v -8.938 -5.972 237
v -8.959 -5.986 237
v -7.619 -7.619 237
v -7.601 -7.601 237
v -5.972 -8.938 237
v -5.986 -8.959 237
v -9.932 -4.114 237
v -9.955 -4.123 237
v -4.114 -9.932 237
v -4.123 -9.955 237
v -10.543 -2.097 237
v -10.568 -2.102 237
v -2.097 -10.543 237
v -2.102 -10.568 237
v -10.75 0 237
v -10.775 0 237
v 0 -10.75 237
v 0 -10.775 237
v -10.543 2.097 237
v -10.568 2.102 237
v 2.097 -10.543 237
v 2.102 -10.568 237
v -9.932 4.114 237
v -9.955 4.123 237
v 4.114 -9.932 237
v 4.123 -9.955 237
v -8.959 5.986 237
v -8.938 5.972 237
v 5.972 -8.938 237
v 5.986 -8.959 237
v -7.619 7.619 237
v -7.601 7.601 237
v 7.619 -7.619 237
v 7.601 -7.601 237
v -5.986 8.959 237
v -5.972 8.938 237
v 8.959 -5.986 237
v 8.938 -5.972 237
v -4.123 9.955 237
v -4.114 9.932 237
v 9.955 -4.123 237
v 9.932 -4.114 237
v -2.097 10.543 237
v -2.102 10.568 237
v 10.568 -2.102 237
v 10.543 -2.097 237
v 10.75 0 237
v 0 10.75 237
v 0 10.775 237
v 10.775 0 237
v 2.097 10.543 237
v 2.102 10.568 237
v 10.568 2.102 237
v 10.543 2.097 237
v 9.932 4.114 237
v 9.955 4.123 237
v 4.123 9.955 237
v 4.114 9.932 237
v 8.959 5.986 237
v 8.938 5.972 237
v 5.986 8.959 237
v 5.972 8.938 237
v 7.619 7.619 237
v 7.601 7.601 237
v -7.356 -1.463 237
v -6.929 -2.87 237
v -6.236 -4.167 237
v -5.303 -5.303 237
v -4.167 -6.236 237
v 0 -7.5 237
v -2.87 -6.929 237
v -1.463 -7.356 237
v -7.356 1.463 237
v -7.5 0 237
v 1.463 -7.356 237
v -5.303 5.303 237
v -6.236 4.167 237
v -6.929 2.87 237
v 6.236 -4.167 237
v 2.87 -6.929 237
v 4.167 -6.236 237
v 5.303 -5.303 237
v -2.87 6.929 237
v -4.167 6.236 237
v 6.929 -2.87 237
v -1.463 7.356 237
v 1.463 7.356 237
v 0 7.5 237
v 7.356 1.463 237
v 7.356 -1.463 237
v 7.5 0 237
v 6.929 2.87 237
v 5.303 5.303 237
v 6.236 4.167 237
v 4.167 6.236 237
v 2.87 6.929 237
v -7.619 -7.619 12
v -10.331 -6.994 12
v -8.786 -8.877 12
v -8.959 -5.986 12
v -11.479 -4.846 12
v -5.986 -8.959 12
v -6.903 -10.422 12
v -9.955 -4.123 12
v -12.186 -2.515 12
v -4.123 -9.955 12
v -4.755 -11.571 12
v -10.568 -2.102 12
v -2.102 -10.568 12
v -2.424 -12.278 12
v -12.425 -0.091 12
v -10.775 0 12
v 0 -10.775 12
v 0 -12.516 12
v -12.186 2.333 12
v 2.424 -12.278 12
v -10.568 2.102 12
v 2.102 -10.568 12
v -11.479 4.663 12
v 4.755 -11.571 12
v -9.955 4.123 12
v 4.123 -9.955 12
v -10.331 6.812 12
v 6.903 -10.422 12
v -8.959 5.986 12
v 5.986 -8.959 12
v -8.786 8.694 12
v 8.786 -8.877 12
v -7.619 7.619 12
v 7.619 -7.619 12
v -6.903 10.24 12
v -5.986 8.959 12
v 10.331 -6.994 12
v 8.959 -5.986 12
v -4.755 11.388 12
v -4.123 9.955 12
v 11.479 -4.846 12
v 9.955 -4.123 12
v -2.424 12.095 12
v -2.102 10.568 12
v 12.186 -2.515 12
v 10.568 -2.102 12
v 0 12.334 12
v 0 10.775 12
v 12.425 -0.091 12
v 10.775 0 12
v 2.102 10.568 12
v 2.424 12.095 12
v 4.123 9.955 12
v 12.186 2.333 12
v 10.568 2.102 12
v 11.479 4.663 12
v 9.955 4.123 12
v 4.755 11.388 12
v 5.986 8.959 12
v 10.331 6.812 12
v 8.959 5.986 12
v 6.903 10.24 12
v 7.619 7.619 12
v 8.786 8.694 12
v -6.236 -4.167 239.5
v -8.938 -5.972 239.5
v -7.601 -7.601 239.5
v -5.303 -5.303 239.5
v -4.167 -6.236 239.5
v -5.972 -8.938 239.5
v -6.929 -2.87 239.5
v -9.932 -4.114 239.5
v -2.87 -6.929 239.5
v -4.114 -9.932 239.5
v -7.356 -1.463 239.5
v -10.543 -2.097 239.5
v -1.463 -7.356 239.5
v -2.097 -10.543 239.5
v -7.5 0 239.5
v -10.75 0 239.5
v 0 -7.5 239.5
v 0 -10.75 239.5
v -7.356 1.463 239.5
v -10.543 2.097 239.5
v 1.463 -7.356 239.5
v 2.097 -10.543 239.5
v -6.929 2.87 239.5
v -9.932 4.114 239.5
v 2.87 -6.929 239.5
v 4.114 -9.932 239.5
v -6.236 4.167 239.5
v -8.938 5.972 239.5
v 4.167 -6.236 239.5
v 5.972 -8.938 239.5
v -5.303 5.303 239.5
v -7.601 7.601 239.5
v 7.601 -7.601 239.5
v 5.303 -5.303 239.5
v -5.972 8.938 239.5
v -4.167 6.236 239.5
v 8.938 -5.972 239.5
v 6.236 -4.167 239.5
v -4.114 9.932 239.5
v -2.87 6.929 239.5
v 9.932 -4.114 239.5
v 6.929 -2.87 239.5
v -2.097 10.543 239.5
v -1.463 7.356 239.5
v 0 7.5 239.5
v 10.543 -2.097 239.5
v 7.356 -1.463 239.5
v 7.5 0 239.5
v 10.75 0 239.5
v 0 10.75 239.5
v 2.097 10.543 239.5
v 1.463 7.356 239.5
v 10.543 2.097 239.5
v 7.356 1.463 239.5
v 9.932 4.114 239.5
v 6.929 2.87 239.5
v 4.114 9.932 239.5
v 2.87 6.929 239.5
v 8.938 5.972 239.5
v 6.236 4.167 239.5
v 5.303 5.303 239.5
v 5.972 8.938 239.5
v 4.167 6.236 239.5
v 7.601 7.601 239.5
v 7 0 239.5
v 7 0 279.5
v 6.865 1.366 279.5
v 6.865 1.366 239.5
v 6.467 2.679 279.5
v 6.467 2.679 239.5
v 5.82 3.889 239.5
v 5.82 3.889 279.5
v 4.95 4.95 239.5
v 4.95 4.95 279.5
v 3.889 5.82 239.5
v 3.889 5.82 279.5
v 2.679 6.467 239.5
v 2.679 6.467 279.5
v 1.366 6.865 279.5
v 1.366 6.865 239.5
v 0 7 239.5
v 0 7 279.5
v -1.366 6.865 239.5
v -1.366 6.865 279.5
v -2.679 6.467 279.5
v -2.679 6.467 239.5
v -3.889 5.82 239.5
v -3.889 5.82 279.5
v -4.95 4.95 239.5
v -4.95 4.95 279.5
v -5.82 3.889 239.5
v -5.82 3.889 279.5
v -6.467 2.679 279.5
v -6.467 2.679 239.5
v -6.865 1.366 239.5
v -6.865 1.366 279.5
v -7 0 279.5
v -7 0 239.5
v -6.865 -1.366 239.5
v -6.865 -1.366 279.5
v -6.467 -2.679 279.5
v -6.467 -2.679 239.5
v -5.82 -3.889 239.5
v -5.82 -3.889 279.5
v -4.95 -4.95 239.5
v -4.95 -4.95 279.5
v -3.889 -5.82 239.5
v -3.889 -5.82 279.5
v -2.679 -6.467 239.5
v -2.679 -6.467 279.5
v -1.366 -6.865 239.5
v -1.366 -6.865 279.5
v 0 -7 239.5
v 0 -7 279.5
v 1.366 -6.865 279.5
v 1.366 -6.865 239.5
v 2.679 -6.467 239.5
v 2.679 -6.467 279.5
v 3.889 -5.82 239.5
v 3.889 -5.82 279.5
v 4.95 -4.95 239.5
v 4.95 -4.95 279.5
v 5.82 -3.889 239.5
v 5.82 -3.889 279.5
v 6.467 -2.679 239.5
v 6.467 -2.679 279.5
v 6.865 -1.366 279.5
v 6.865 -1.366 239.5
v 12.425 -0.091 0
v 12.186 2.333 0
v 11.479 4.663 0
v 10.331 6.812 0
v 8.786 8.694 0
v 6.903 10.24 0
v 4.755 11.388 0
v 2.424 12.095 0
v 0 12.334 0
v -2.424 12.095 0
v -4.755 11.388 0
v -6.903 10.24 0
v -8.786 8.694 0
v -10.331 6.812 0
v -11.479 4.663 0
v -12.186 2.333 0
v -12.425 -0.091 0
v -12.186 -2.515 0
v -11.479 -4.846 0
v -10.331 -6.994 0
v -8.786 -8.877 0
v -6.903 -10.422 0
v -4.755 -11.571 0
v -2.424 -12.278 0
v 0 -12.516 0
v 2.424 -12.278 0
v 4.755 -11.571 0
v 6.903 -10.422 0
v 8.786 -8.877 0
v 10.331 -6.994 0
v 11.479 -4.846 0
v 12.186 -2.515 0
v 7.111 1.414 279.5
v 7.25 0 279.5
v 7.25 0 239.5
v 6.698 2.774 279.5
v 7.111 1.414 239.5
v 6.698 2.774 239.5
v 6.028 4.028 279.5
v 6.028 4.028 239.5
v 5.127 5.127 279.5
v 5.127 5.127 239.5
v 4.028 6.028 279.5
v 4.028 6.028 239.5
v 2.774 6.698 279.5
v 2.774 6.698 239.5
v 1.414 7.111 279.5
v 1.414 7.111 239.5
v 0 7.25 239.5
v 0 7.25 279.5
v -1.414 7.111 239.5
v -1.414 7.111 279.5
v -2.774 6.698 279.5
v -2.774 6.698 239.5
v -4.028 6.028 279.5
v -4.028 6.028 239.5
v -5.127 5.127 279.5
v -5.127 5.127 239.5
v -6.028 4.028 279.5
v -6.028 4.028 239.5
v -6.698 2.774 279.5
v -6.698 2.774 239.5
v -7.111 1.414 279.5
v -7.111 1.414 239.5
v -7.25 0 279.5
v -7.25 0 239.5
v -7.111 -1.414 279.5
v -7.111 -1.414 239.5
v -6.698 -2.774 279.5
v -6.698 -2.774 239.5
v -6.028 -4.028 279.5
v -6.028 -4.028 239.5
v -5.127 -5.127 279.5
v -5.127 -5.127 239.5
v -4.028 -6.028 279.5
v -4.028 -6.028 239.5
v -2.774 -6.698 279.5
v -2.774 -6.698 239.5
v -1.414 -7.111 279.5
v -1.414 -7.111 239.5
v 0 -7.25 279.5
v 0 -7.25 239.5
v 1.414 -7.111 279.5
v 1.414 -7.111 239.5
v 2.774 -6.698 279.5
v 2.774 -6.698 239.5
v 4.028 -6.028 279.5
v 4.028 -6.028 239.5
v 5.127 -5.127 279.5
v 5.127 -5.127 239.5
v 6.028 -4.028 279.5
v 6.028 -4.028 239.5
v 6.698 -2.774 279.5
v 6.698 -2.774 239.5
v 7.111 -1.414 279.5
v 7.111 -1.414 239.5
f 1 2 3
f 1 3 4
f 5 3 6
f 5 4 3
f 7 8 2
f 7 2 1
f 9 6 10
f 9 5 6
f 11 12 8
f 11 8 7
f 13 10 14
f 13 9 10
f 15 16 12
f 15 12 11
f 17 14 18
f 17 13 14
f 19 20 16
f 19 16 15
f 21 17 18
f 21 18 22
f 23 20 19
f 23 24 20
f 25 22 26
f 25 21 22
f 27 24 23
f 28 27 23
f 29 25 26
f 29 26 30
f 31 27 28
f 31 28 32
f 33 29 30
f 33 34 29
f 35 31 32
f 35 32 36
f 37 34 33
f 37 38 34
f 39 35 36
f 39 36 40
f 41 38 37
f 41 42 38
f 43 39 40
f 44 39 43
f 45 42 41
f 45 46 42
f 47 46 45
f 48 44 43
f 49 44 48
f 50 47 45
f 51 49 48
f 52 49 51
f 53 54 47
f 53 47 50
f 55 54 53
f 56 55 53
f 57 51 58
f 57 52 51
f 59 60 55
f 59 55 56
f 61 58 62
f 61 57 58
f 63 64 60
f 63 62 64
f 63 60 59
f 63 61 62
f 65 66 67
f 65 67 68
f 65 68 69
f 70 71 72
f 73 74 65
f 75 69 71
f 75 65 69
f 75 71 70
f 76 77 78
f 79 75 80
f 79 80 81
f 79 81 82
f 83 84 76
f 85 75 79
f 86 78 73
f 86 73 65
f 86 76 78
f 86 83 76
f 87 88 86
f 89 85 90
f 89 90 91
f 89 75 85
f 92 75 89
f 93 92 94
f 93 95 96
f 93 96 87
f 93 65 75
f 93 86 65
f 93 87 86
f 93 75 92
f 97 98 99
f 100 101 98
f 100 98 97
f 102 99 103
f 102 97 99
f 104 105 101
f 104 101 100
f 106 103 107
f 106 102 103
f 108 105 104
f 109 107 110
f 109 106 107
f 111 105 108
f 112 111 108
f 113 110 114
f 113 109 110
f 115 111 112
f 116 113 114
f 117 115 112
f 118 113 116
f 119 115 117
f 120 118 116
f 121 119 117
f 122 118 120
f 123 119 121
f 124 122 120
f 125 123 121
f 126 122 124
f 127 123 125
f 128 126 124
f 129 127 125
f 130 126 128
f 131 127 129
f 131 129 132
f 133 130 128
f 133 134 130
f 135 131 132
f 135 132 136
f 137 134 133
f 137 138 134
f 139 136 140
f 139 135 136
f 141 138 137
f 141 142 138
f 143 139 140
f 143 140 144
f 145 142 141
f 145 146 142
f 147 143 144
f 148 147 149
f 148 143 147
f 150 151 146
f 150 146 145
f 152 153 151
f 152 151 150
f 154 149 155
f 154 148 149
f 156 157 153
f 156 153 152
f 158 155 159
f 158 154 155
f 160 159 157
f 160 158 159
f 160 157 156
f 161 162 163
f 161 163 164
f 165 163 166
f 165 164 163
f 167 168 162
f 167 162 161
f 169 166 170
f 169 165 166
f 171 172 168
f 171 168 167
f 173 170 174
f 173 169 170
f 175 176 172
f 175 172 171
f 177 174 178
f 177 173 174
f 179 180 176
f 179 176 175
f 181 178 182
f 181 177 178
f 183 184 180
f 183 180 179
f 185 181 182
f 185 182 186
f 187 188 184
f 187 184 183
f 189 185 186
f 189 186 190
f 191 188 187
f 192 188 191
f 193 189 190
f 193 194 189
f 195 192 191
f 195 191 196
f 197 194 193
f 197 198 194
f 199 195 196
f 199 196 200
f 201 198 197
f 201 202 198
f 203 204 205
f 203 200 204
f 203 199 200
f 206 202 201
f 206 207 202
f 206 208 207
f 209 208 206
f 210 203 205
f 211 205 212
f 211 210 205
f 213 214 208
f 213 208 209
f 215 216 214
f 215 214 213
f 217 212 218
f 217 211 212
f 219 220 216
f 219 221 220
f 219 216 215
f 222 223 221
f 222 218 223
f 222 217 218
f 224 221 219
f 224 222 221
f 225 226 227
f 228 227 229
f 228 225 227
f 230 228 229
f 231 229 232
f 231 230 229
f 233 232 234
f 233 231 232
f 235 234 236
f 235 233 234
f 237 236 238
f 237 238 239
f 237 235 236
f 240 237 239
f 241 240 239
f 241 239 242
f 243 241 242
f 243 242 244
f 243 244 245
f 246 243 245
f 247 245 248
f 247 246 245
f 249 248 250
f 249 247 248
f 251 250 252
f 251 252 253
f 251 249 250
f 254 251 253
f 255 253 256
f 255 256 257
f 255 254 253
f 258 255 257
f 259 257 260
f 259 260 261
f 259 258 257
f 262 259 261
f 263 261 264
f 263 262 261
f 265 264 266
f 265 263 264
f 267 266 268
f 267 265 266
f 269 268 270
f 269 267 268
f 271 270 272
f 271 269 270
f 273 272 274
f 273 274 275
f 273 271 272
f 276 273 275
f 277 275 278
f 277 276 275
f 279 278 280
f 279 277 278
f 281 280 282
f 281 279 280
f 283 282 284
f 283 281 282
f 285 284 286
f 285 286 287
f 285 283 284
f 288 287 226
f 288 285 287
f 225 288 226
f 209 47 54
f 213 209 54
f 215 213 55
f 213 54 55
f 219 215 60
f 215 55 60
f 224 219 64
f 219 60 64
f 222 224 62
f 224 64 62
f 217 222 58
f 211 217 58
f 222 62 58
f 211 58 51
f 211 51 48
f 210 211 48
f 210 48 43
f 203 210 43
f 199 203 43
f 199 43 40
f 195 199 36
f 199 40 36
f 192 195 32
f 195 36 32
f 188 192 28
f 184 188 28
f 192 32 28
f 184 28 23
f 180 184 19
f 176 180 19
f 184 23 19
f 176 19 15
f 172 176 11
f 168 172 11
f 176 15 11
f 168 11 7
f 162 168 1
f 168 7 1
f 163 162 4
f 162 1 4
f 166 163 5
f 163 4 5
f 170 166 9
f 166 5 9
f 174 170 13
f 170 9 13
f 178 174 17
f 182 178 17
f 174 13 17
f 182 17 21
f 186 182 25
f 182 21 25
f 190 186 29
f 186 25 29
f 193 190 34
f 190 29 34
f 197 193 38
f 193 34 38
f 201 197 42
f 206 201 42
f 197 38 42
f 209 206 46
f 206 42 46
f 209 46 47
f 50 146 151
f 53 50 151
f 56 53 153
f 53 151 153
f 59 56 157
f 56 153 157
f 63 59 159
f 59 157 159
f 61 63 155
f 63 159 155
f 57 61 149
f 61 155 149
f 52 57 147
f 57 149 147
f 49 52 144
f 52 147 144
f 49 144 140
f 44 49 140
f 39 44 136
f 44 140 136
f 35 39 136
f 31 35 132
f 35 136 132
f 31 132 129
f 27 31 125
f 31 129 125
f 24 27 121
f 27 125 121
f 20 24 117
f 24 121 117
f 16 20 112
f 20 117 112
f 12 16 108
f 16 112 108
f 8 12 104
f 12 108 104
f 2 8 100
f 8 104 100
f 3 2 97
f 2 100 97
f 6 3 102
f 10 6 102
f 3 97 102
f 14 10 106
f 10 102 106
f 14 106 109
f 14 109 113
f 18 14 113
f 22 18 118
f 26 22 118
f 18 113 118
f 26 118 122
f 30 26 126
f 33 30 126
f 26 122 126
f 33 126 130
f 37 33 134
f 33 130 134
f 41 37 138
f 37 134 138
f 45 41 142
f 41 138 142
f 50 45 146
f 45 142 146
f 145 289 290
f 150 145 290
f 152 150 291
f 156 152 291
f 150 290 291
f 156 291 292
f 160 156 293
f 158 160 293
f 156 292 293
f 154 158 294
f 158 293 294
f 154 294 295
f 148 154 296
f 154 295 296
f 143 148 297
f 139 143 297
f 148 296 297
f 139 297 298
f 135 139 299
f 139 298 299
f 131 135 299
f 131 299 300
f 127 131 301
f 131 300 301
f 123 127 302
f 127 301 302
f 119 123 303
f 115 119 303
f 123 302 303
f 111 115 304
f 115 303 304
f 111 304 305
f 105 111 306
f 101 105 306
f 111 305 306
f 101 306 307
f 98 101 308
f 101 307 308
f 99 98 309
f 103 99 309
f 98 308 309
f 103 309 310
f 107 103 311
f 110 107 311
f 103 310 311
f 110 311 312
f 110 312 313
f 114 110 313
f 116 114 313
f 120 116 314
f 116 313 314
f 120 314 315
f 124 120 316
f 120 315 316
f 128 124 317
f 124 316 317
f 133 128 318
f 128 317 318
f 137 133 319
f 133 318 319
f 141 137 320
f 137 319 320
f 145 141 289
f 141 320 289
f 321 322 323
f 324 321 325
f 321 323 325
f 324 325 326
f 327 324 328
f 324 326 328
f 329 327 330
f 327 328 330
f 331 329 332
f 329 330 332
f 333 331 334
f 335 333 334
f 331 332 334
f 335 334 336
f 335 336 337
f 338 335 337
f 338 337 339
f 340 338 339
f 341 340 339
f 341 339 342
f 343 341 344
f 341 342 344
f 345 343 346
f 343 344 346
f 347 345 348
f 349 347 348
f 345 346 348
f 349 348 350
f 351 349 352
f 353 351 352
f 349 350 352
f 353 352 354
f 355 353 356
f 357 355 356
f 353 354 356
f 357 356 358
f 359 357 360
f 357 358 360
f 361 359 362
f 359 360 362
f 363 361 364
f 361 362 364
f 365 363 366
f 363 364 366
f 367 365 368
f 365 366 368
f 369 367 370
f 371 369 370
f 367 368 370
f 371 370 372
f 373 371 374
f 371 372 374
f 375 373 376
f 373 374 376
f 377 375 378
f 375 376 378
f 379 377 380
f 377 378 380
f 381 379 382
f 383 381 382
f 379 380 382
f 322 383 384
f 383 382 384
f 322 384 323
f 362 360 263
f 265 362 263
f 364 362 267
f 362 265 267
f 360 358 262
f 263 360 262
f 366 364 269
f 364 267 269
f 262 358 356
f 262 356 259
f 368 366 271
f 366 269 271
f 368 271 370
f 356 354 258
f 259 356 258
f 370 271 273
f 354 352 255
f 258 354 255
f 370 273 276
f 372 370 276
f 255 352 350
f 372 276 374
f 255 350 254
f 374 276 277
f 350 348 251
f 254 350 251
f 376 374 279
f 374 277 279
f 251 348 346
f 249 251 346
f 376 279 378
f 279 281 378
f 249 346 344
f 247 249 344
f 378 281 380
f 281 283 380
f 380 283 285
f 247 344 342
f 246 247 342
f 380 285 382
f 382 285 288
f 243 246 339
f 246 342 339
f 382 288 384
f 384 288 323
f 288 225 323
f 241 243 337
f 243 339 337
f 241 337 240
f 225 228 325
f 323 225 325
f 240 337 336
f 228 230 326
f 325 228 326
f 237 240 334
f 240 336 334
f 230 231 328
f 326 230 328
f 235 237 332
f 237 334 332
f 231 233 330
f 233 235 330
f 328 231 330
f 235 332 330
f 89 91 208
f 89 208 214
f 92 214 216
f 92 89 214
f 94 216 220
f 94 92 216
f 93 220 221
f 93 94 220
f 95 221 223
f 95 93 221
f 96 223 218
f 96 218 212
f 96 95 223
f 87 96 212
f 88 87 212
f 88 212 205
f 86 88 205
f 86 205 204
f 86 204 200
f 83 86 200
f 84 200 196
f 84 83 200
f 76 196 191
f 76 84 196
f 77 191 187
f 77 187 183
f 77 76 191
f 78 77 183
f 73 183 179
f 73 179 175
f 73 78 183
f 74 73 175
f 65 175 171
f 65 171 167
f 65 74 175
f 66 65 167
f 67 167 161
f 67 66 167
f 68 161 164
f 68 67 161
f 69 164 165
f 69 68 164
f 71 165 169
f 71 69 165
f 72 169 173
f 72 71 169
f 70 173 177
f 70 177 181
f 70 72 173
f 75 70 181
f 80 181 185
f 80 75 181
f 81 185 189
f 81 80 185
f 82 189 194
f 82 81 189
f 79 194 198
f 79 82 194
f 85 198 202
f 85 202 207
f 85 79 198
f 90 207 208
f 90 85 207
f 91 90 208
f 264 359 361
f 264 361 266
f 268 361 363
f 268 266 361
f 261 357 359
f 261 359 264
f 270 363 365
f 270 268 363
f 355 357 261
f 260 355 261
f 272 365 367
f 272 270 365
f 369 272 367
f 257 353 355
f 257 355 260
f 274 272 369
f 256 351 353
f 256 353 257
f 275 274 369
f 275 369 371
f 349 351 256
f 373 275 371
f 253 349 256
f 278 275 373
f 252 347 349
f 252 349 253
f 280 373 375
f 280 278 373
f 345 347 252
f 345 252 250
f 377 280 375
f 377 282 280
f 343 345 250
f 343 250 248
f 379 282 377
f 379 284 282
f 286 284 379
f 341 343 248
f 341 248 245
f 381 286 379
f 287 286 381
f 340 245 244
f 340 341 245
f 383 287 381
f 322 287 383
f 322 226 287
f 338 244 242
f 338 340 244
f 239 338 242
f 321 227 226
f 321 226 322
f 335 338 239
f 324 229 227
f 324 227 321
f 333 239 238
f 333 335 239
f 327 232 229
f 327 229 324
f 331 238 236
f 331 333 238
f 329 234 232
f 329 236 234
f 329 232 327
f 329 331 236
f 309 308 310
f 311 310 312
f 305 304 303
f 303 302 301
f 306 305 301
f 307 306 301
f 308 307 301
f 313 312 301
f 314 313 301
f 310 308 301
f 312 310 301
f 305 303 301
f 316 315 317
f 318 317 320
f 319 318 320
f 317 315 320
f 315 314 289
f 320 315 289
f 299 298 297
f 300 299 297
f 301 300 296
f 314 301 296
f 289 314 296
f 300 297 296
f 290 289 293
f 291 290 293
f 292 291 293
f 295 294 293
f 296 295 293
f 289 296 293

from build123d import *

# Parameters (mm, degrees)
F0_R     = 12.425
F1_DEPTH = 12
F2_R     = 10.775
F3_DEPTH = 225
F4_R     = 10.75
F4_R_2   = 7.5
F5_DEPTH = 2.5
F6_R     = 7.25
F6_R_2   = 7
F7_DEPTH = 40


with BuildPart() as f1:
    # F0 (on Top) → F1 (new body)
    with BuildSketch(Plane.XY):
        with Locations((1e-06, -0.09144)):
            Circle(F0_R)
    extrude(amount=F1_DEPTH)

    # F2 (on face) → F3 (join)
    with BuildSketch(Plane.XY.offset(12)):
        Circle(F2_R)
    extrude(amount=F3_DEPTH)

    # F4 (on face) → F5 (join)
    with BuildSketch(Plane.XY.offset(237)):
        Circle(F4_R)
        Circle(F4_R_2, mode=Mode.SUBTRACT)
    extrude(amount=F5_DEPTH)


with BuildPart() as f7:
    # F6 (on face) → F7 (new body)
    with BuildSketch(Plane.XY.offset(239.5)):
        Circle(F6_R)
        Circle(F6_R_2, mode=Mode.SUBTRACT)
    extrude(amount=F7_DEPTH)


solid = Compound([f1.part, f7.part])
